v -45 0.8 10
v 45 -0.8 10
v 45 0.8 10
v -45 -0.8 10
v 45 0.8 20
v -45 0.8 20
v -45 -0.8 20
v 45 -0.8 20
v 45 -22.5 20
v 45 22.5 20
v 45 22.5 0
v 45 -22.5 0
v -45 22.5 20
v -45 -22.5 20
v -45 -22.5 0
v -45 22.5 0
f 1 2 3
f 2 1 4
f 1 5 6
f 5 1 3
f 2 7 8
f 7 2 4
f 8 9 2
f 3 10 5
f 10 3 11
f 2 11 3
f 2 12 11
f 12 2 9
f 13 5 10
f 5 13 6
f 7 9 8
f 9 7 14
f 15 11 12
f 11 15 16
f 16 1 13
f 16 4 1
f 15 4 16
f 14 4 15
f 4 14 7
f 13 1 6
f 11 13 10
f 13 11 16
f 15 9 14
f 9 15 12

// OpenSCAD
// Slide drying rack - holds 10 microscope slides standing upright on their long edge
// Print orientation: base block on the bed (z = 0), slots open upward (+Z)

// ---------------- Parameters ----------------
block_len    = 90;    // base block length along X (mm)
block_wid    = 45;    // base block width along Y (mm)
block_h      = 20;    // base block height along Z (mm)

slot_count   = 10;    // number of slide slots
slot_len     = 77;    // slot length along X (mm)
slot_w       = 1.6;   // slot width along Y (mm)
slot_depth   = 10;    // slot depth from top face (mm)
slot_pitch   = 3.5;   // centre-to-centre spacing of slots along Y (mm)

eps          = 0.5;   // overshoot of cutters past the top face (mm)

$fn = 64;

// ---------------- Model ----------------
difference() {
    // Solid base block, centred in X and Y, resting on z = 0
    translate([-block_len/2, -block_wid/2, 0])
        cube([block_len, block_wid, block_h]);

    // Parallel slots running along X, centred as a group in X and Y
    for (i = [0 : slot_count - 1]) {
        x = (i - (slot_count - 1)/2) * slot_pitch;
        translate([x - slot_len/2, -slot_w/2, block_h - slot_depth])
            cube([slot_len, slot_w, slot_depth + eps]);
    }
}
